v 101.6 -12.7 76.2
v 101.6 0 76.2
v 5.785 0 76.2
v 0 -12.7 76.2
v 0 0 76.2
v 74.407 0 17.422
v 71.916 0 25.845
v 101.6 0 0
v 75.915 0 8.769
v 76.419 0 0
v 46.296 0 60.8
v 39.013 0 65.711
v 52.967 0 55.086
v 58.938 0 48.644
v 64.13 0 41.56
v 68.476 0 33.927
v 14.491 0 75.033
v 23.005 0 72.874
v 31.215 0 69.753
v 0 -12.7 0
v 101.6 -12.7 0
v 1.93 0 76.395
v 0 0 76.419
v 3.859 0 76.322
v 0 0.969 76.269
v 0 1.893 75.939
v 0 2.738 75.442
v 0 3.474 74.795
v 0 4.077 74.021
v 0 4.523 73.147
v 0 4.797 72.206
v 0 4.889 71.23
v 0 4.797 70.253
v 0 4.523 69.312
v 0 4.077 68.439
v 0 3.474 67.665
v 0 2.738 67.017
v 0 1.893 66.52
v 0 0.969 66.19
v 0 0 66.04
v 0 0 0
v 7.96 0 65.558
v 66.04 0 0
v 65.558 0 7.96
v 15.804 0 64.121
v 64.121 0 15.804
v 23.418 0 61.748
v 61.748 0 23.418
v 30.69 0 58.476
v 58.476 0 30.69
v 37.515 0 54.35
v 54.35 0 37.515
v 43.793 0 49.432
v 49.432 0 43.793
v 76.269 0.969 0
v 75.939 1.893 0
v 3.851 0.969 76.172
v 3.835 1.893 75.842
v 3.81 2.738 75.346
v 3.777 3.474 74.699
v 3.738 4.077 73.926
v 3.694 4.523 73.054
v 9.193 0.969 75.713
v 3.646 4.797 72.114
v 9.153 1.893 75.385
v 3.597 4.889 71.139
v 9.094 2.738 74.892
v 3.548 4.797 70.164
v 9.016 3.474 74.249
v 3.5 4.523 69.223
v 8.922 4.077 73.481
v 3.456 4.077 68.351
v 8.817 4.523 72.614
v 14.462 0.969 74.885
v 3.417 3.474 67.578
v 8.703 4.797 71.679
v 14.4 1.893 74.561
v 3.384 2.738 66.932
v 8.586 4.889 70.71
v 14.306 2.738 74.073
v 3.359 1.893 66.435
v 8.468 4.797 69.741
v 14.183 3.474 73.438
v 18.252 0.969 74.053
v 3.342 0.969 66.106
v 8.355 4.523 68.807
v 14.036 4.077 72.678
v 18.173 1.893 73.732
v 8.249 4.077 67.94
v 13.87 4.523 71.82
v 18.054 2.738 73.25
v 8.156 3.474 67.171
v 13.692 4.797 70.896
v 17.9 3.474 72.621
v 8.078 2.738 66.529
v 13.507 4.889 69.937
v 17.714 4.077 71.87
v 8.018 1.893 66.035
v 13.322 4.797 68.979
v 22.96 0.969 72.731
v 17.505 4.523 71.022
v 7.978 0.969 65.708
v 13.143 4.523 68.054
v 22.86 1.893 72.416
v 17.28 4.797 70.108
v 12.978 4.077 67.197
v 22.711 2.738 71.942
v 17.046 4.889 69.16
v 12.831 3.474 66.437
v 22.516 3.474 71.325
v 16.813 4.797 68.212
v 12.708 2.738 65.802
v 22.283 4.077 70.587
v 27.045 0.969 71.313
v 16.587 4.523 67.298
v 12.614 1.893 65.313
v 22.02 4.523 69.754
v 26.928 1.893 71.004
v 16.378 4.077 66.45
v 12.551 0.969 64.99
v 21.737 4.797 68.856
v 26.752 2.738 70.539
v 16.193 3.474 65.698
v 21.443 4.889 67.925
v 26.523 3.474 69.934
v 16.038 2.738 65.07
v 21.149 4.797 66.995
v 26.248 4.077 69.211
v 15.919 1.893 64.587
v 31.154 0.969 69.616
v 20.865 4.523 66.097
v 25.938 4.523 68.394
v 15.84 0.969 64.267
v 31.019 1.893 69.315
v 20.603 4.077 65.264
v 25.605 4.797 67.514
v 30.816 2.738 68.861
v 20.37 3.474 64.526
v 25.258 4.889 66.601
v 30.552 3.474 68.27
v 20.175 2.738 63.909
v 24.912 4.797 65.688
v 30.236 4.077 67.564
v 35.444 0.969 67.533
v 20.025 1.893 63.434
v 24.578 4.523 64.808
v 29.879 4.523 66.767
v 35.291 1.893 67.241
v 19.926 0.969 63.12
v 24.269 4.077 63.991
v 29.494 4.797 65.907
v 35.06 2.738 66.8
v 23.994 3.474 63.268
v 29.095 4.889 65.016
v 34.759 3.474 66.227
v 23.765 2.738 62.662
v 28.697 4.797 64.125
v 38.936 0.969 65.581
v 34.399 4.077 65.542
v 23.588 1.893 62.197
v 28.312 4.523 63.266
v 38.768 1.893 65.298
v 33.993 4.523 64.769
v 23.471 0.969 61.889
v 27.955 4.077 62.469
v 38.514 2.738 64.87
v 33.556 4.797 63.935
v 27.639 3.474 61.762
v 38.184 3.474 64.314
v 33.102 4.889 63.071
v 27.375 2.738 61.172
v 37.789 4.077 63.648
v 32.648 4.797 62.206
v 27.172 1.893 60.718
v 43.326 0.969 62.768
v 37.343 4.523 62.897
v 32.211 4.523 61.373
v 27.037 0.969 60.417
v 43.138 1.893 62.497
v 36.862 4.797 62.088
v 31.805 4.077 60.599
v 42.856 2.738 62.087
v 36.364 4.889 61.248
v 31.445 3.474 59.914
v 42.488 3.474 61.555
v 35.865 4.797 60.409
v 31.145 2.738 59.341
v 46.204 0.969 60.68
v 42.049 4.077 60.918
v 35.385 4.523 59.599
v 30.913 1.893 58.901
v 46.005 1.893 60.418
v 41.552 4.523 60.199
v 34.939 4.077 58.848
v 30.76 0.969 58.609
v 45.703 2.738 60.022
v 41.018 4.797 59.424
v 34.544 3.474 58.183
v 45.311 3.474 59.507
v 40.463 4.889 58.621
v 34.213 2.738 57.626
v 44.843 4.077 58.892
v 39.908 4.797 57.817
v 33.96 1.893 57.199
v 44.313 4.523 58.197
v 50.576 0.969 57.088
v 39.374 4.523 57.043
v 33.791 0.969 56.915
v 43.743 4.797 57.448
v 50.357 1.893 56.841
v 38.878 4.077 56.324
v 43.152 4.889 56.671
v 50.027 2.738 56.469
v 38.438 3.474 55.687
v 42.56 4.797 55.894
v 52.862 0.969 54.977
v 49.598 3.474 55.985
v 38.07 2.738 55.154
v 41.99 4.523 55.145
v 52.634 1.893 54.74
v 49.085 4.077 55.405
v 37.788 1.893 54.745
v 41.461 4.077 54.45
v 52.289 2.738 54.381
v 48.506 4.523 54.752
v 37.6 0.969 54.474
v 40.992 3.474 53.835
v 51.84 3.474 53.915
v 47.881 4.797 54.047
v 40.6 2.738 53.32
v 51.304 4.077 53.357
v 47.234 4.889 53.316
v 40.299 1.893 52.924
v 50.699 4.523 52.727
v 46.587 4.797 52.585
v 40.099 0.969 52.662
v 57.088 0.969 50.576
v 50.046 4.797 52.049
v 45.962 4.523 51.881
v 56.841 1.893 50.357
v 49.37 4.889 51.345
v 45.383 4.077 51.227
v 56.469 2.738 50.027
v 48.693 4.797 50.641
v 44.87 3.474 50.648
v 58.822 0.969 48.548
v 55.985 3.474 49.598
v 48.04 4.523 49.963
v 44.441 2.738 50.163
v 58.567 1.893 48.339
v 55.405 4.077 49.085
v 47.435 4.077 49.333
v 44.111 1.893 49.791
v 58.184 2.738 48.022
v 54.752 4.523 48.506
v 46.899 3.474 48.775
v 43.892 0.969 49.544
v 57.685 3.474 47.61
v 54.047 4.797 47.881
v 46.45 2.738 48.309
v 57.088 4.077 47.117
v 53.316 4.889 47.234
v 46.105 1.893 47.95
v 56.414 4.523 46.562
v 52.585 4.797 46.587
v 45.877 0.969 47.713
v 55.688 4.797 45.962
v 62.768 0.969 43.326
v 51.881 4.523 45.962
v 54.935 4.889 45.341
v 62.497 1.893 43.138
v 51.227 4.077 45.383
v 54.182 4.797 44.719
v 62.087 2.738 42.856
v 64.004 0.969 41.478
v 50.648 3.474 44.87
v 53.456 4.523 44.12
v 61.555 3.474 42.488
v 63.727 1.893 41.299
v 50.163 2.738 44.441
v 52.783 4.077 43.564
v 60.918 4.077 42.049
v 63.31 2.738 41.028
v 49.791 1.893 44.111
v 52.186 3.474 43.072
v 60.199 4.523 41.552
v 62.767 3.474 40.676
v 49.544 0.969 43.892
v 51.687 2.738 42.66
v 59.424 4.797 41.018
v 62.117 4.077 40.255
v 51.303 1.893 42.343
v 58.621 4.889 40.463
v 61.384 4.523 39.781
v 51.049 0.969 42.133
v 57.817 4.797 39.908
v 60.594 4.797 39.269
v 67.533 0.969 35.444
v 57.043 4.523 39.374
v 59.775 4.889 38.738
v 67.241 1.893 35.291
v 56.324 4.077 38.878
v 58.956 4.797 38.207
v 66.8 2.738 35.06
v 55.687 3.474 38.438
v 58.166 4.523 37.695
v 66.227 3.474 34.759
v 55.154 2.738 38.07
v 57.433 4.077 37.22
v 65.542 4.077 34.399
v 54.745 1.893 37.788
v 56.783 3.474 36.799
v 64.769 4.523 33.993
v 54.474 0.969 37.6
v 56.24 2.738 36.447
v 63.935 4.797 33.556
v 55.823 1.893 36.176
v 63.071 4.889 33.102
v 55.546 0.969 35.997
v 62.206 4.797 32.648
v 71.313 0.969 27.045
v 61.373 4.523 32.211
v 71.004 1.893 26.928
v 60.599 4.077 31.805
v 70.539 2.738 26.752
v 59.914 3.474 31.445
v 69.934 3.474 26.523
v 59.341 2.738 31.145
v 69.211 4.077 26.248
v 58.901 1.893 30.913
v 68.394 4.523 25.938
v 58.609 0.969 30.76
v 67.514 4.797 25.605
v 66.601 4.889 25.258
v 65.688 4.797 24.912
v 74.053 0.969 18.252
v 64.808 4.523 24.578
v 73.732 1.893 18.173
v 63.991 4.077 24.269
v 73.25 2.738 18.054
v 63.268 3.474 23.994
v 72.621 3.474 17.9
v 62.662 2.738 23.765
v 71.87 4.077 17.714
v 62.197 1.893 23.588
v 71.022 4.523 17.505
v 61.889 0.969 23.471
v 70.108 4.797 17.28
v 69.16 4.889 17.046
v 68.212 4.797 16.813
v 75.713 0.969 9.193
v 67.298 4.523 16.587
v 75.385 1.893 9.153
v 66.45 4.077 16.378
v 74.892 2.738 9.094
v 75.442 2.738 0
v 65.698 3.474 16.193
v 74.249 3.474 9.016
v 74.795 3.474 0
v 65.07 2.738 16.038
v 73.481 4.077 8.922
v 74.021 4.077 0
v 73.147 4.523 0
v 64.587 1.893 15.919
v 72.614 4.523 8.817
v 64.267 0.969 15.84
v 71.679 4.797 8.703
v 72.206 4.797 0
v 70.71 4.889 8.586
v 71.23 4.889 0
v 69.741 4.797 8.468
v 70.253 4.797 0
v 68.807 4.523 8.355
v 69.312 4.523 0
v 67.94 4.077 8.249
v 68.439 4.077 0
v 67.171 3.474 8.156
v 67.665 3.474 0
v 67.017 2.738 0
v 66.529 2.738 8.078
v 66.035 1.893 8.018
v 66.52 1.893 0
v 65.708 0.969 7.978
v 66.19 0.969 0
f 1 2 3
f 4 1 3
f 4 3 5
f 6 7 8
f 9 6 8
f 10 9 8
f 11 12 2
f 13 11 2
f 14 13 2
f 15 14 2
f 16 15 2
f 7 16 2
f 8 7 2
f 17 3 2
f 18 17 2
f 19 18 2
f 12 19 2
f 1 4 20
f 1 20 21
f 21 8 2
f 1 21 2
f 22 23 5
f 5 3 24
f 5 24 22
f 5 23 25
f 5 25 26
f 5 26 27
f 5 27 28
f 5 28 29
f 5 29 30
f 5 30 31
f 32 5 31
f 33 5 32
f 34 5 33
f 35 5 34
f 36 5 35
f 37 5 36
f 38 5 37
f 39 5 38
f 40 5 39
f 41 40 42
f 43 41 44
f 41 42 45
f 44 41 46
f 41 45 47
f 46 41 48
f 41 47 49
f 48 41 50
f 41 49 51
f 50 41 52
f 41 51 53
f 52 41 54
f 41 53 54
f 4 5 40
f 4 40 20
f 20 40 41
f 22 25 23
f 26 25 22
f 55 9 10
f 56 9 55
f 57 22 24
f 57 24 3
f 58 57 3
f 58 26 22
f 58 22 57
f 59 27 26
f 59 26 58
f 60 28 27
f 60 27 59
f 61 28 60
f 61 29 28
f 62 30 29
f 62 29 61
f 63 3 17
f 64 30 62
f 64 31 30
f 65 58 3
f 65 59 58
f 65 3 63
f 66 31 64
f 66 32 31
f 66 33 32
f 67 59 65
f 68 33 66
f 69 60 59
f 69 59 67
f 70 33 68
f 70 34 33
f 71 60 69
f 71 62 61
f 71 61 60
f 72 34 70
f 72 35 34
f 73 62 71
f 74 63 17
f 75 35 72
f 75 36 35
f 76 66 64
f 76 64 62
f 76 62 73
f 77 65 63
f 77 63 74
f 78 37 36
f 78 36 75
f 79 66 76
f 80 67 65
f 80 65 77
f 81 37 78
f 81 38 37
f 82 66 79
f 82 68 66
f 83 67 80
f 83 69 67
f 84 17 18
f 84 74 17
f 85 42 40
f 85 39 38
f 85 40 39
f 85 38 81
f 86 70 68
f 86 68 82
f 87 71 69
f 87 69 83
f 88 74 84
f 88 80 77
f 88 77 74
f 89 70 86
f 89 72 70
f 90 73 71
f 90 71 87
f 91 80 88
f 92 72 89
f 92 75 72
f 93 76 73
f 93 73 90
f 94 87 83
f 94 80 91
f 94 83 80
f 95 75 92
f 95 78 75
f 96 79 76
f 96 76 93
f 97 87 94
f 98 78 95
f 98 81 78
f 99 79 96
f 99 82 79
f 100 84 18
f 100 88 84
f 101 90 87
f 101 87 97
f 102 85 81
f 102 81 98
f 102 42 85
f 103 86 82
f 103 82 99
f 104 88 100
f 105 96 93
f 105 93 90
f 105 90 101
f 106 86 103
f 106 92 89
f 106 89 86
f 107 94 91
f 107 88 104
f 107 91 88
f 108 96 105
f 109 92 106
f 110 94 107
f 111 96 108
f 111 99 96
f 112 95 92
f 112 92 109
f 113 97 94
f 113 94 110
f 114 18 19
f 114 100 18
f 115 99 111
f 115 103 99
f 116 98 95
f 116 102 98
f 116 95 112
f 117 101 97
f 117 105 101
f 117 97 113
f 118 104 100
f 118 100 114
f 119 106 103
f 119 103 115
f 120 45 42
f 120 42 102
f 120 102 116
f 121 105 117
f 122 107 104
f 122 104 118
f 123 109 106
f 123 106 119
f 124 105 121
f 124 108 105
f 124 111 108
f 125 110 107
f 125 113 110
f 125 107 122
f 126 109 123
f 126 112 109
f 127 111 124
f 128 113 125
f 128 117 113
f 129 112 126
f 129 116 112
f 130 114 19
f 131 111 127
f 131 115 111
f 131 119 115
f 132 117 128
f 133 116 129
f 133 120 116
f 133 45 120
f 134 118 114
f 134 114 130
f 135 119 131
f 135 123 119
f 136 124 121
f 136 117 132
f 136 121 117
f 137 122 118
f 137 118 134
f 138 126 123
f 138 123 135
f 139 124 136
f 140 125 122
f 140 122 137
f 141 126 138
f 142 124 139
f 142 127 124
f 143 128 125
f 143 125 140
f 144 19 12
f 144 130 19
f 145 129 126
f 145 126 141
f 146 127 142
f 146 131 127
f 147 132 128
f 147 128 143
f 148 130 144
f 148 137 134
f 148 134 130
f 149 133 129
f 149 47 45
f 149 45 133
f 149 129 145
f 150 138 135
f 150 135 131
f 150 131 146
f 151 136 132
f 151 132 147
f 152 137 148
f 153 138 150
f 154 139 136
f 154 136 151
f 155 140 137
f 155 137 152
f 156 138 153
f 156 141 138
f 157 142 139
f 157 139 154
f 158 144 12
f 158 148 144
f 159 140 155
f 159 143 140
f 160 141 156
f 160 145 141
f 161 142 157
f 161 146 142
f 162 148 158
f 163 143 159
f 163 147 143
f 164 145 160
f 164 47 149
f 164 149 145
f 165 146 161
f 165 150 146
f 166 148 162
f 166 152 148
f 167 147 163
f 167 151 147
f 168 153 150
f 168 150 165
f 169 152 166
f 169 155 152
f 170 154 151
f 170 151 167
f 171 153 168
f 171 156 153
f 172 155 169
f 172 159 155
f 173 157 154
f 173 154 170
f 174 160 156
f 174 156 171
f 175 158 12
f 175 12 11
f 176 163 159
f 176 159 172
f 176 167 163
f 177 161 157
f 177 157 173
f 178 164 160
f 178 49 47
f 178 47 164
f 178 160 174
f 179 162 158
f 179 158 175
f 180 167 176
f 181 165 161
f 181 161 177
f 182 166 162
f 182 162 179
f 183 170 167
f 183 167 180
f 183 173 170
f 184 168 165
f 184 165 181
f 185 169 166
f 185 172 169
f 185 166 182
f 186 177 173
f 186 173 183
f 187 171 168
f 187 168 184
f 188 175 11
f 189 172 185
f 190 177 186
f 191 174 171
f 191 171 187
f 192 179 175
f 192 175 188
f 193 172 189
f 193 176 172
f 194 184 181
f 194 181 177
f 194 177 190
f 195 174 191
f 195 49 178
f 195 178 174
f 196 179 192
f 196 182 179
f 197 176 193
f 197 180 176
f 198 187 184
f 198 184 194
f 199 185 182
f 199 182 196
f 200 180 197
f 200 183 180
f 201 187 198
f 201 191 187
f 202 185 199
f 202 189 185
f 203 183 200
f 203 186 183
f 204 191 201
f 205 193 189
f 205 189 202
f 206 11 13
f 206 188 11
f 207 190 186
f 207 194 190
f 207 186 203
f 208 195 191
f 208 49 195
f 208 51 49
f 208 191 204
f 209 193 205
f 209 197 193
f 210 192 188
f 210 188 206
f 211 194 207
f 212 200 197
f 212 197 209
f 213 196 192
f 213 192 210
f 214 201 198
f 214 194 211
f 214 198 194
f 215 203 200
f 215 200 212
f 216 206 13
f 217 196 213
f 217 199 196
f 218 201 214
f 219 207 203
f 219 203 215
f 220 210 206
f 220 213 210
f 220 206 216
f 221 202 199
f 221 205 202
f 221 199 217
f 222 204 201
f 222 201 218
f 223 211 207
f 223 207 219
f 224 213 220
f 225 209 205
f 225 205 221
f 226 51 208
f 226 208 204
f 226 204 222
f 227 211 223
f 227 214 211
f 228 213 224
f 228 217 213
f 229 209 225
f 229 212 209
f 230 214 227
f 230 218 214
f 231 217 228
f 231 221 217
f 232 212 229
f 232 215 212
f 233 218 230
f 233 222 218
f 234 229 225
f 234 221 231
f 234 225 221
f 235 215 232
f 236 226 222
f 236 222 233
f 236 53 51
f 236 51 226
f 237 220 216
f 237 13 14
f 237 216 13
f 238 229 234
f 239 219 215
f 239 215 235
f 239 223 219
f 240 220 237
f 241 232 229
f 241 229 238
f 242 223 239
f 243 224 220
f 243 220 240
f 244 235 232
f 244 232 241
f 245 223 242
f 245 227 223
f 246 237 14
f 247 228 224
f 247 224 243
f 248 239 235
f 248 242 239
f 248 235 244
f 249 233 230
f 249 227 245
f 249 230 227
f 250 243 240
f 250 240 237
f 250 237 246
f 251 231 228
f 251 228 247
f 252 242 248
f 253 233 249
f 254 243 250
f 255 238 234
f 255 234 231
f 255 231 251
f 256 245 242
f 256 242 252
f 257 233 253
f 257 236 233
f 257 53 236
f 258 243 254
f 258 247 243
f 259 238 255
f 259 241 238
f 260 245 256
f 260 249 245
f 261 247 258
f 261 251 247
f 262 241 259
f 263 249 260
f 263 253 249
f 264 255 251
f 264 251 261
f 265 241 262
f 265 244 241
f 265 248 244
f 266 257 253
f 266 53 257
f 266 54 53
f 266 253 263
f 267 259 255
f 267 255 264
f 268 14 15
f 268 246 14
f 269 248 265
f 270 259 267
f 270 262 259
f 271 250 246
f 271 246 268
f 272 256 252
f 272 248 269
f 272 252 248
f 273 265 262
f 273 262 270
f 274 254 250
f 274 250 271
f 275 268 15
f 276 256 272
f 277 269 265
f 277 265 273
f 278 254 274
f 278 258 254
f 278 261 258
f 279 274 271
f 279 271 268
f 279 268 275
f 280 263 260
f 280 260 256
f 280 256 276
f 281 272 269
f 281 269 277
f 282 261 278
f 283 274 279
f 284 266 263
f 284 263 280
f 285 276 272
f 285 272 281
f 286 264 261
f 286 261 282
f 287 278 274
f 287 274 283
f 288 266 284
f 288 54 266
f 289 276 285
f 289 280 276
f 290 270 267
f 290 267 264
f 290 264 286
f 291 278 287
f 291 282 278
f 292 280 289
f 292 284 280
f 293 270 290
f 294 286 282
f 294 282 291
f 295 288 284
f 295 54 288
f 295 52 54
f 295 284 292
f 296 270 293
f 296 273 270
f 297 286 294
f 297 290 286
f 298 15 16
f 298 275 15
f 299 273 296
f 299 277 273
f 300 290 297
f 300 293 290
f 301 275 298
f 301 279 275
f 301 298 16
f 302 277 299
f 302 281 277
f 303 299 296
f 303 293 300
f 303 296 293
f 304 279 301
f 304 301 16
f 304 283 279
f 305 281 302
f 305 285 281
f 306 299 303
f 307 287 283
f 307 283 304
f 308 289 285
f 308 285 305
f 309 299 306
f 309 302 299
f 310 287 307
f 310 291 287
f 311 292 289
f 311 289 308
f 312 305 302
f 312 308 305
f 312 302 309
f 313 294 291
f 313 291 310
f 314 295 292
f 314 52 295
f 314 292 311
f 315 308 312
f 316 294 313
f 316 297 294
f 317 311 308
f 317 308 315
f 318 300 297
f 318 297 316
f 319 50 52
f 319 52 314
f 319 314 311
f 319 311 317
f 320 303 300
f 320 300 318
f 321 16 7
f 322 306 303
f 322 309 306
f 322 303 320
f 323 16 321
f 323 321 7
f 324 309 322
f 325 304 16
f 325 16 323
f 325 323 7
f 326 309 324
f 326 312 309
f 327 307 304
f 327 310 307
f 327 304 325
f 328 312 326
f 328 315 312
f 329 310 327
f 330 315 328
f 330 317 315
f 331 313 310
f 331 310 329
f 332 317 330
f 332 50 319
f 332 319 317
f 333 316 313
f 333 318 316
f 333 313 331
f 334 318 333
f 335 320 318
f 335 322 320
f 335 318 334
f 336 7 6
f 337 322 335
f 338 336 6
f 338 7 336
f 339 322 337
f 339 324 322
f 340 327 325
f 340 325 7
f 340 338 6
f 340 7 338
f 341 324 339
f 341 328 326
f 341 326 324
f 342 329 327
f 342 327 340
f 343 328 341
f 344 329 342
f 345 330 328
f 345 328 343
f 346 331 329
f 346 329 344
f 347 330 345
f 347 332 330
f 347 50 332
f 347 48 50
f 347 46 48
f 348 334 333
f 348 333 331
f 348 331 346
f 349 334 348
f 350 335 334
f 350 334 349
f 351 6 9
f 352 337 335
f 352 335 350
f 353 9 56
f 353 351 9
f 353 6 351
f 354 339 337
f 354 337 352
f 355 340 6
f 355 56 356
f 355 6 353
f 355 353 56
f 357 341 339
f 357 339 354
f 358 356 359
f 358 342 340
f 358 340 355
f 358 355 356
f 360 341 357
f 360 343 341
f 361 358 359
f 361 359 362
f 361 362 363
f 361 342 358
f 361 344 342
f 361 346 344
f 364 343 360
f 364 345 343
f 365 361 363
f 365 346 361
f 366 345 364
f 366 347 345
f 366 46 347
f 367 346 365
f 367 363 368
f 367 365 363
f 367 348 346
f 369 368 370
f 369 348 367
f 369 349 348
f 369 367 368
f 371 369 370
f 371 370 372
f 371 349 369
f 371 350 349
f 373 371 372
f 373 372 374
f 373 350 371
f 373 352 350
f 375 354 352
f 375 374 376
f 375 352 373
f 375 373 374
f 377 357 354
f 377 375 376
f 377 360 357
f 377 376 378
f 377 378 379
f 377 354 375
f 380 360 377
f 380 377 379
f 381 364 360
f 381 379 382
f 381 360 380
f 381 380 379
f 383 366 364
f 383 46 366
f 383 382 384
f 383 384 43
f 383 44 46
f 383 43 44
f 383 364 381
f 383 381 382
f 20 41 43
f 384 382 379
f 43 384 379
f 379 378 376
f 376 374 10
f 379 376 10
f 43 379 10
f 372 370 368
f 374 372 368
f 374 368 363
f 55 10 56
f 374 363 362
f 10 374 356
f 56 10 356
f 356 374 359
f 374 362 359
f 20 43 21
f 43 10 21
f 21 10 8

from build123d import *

# Parameters (mm, degrees)
F1_DEPTH = 12.7


with BuildPart() as f1:
    # F0 (on Front) → F1 (new body)
    with BuildSketch(Plane.XZ):
        with BuildLine():
            Line((0, 76.2), (0, 0))
            Line((0, 0), (71.12, 0))
            ThreePointArc((71.12, 0), (72.5485199348, 3.5317266787), (76.0306666667, 5.0771769934))
            ThreePointArc((76.0306666667, 5.0771769934), (52.0555429955, 55.6476454439), (0, 76.2))
        make_face()
        with BuildLine():
            ThreePointArc((76.0306666667, 5.0771769934), (72.5485199348, 3.5317266787), (71.12, 0))
            Line((71.12, 0), (76.2, 0))
            ThreePointArc((76.2, 0), (76.1576549009, 2.54), (76.0306666667, 5.0771769934))
        make_face()
        with BuildLine():
            ThreePointArc((76.0306666667, 5.0771769934), (76.1576549009, 2.54), (76.2, 0))
            Line((76.2, 0), (81.28, 0))
            ThreePointArc((81.28, 0), (79.7317266787, 3.6514800652), (76.0306666667, 5.0771769934))
        make_face()
        with BuildLine():
            Line((101.6, 76.2), (0, 76.2))
            ThreePointArc((0, 76.2), (52.0555429955, 55.6476454439), (76.0306666667, 5.0771769934))
            ThreePointArc((76.0306666667, 5.0771769934), (79.7317266787, 3.6514800652), (81.28, 0))
            Line((81.28, 0), (101.6, 0))
            Line((101.6, 0), (101.6, 76.2))
        make_face()
    extrude(amount=F1_DEPTH)

    # F3: sweep along a path in F0
    with BuildLine(Plane.XZ) as f3_path:
        ThreePointArc((0, 76.2), (53.8815367264, 53.8815367264), (76.2, 0))
    # F2 (on Top) → F3 (sweep)
    with BuildSketch(Plane.XY):
        with BuildLine():
            ThreePointArc((76.419301331, 0), (71.2296506655, 4.8893362163), (66.04, 0))
            Line((66.04, 0), (76.419301331, 0))
        make_face()
    sweep(path=f3_path.line)


solid = f1.part
